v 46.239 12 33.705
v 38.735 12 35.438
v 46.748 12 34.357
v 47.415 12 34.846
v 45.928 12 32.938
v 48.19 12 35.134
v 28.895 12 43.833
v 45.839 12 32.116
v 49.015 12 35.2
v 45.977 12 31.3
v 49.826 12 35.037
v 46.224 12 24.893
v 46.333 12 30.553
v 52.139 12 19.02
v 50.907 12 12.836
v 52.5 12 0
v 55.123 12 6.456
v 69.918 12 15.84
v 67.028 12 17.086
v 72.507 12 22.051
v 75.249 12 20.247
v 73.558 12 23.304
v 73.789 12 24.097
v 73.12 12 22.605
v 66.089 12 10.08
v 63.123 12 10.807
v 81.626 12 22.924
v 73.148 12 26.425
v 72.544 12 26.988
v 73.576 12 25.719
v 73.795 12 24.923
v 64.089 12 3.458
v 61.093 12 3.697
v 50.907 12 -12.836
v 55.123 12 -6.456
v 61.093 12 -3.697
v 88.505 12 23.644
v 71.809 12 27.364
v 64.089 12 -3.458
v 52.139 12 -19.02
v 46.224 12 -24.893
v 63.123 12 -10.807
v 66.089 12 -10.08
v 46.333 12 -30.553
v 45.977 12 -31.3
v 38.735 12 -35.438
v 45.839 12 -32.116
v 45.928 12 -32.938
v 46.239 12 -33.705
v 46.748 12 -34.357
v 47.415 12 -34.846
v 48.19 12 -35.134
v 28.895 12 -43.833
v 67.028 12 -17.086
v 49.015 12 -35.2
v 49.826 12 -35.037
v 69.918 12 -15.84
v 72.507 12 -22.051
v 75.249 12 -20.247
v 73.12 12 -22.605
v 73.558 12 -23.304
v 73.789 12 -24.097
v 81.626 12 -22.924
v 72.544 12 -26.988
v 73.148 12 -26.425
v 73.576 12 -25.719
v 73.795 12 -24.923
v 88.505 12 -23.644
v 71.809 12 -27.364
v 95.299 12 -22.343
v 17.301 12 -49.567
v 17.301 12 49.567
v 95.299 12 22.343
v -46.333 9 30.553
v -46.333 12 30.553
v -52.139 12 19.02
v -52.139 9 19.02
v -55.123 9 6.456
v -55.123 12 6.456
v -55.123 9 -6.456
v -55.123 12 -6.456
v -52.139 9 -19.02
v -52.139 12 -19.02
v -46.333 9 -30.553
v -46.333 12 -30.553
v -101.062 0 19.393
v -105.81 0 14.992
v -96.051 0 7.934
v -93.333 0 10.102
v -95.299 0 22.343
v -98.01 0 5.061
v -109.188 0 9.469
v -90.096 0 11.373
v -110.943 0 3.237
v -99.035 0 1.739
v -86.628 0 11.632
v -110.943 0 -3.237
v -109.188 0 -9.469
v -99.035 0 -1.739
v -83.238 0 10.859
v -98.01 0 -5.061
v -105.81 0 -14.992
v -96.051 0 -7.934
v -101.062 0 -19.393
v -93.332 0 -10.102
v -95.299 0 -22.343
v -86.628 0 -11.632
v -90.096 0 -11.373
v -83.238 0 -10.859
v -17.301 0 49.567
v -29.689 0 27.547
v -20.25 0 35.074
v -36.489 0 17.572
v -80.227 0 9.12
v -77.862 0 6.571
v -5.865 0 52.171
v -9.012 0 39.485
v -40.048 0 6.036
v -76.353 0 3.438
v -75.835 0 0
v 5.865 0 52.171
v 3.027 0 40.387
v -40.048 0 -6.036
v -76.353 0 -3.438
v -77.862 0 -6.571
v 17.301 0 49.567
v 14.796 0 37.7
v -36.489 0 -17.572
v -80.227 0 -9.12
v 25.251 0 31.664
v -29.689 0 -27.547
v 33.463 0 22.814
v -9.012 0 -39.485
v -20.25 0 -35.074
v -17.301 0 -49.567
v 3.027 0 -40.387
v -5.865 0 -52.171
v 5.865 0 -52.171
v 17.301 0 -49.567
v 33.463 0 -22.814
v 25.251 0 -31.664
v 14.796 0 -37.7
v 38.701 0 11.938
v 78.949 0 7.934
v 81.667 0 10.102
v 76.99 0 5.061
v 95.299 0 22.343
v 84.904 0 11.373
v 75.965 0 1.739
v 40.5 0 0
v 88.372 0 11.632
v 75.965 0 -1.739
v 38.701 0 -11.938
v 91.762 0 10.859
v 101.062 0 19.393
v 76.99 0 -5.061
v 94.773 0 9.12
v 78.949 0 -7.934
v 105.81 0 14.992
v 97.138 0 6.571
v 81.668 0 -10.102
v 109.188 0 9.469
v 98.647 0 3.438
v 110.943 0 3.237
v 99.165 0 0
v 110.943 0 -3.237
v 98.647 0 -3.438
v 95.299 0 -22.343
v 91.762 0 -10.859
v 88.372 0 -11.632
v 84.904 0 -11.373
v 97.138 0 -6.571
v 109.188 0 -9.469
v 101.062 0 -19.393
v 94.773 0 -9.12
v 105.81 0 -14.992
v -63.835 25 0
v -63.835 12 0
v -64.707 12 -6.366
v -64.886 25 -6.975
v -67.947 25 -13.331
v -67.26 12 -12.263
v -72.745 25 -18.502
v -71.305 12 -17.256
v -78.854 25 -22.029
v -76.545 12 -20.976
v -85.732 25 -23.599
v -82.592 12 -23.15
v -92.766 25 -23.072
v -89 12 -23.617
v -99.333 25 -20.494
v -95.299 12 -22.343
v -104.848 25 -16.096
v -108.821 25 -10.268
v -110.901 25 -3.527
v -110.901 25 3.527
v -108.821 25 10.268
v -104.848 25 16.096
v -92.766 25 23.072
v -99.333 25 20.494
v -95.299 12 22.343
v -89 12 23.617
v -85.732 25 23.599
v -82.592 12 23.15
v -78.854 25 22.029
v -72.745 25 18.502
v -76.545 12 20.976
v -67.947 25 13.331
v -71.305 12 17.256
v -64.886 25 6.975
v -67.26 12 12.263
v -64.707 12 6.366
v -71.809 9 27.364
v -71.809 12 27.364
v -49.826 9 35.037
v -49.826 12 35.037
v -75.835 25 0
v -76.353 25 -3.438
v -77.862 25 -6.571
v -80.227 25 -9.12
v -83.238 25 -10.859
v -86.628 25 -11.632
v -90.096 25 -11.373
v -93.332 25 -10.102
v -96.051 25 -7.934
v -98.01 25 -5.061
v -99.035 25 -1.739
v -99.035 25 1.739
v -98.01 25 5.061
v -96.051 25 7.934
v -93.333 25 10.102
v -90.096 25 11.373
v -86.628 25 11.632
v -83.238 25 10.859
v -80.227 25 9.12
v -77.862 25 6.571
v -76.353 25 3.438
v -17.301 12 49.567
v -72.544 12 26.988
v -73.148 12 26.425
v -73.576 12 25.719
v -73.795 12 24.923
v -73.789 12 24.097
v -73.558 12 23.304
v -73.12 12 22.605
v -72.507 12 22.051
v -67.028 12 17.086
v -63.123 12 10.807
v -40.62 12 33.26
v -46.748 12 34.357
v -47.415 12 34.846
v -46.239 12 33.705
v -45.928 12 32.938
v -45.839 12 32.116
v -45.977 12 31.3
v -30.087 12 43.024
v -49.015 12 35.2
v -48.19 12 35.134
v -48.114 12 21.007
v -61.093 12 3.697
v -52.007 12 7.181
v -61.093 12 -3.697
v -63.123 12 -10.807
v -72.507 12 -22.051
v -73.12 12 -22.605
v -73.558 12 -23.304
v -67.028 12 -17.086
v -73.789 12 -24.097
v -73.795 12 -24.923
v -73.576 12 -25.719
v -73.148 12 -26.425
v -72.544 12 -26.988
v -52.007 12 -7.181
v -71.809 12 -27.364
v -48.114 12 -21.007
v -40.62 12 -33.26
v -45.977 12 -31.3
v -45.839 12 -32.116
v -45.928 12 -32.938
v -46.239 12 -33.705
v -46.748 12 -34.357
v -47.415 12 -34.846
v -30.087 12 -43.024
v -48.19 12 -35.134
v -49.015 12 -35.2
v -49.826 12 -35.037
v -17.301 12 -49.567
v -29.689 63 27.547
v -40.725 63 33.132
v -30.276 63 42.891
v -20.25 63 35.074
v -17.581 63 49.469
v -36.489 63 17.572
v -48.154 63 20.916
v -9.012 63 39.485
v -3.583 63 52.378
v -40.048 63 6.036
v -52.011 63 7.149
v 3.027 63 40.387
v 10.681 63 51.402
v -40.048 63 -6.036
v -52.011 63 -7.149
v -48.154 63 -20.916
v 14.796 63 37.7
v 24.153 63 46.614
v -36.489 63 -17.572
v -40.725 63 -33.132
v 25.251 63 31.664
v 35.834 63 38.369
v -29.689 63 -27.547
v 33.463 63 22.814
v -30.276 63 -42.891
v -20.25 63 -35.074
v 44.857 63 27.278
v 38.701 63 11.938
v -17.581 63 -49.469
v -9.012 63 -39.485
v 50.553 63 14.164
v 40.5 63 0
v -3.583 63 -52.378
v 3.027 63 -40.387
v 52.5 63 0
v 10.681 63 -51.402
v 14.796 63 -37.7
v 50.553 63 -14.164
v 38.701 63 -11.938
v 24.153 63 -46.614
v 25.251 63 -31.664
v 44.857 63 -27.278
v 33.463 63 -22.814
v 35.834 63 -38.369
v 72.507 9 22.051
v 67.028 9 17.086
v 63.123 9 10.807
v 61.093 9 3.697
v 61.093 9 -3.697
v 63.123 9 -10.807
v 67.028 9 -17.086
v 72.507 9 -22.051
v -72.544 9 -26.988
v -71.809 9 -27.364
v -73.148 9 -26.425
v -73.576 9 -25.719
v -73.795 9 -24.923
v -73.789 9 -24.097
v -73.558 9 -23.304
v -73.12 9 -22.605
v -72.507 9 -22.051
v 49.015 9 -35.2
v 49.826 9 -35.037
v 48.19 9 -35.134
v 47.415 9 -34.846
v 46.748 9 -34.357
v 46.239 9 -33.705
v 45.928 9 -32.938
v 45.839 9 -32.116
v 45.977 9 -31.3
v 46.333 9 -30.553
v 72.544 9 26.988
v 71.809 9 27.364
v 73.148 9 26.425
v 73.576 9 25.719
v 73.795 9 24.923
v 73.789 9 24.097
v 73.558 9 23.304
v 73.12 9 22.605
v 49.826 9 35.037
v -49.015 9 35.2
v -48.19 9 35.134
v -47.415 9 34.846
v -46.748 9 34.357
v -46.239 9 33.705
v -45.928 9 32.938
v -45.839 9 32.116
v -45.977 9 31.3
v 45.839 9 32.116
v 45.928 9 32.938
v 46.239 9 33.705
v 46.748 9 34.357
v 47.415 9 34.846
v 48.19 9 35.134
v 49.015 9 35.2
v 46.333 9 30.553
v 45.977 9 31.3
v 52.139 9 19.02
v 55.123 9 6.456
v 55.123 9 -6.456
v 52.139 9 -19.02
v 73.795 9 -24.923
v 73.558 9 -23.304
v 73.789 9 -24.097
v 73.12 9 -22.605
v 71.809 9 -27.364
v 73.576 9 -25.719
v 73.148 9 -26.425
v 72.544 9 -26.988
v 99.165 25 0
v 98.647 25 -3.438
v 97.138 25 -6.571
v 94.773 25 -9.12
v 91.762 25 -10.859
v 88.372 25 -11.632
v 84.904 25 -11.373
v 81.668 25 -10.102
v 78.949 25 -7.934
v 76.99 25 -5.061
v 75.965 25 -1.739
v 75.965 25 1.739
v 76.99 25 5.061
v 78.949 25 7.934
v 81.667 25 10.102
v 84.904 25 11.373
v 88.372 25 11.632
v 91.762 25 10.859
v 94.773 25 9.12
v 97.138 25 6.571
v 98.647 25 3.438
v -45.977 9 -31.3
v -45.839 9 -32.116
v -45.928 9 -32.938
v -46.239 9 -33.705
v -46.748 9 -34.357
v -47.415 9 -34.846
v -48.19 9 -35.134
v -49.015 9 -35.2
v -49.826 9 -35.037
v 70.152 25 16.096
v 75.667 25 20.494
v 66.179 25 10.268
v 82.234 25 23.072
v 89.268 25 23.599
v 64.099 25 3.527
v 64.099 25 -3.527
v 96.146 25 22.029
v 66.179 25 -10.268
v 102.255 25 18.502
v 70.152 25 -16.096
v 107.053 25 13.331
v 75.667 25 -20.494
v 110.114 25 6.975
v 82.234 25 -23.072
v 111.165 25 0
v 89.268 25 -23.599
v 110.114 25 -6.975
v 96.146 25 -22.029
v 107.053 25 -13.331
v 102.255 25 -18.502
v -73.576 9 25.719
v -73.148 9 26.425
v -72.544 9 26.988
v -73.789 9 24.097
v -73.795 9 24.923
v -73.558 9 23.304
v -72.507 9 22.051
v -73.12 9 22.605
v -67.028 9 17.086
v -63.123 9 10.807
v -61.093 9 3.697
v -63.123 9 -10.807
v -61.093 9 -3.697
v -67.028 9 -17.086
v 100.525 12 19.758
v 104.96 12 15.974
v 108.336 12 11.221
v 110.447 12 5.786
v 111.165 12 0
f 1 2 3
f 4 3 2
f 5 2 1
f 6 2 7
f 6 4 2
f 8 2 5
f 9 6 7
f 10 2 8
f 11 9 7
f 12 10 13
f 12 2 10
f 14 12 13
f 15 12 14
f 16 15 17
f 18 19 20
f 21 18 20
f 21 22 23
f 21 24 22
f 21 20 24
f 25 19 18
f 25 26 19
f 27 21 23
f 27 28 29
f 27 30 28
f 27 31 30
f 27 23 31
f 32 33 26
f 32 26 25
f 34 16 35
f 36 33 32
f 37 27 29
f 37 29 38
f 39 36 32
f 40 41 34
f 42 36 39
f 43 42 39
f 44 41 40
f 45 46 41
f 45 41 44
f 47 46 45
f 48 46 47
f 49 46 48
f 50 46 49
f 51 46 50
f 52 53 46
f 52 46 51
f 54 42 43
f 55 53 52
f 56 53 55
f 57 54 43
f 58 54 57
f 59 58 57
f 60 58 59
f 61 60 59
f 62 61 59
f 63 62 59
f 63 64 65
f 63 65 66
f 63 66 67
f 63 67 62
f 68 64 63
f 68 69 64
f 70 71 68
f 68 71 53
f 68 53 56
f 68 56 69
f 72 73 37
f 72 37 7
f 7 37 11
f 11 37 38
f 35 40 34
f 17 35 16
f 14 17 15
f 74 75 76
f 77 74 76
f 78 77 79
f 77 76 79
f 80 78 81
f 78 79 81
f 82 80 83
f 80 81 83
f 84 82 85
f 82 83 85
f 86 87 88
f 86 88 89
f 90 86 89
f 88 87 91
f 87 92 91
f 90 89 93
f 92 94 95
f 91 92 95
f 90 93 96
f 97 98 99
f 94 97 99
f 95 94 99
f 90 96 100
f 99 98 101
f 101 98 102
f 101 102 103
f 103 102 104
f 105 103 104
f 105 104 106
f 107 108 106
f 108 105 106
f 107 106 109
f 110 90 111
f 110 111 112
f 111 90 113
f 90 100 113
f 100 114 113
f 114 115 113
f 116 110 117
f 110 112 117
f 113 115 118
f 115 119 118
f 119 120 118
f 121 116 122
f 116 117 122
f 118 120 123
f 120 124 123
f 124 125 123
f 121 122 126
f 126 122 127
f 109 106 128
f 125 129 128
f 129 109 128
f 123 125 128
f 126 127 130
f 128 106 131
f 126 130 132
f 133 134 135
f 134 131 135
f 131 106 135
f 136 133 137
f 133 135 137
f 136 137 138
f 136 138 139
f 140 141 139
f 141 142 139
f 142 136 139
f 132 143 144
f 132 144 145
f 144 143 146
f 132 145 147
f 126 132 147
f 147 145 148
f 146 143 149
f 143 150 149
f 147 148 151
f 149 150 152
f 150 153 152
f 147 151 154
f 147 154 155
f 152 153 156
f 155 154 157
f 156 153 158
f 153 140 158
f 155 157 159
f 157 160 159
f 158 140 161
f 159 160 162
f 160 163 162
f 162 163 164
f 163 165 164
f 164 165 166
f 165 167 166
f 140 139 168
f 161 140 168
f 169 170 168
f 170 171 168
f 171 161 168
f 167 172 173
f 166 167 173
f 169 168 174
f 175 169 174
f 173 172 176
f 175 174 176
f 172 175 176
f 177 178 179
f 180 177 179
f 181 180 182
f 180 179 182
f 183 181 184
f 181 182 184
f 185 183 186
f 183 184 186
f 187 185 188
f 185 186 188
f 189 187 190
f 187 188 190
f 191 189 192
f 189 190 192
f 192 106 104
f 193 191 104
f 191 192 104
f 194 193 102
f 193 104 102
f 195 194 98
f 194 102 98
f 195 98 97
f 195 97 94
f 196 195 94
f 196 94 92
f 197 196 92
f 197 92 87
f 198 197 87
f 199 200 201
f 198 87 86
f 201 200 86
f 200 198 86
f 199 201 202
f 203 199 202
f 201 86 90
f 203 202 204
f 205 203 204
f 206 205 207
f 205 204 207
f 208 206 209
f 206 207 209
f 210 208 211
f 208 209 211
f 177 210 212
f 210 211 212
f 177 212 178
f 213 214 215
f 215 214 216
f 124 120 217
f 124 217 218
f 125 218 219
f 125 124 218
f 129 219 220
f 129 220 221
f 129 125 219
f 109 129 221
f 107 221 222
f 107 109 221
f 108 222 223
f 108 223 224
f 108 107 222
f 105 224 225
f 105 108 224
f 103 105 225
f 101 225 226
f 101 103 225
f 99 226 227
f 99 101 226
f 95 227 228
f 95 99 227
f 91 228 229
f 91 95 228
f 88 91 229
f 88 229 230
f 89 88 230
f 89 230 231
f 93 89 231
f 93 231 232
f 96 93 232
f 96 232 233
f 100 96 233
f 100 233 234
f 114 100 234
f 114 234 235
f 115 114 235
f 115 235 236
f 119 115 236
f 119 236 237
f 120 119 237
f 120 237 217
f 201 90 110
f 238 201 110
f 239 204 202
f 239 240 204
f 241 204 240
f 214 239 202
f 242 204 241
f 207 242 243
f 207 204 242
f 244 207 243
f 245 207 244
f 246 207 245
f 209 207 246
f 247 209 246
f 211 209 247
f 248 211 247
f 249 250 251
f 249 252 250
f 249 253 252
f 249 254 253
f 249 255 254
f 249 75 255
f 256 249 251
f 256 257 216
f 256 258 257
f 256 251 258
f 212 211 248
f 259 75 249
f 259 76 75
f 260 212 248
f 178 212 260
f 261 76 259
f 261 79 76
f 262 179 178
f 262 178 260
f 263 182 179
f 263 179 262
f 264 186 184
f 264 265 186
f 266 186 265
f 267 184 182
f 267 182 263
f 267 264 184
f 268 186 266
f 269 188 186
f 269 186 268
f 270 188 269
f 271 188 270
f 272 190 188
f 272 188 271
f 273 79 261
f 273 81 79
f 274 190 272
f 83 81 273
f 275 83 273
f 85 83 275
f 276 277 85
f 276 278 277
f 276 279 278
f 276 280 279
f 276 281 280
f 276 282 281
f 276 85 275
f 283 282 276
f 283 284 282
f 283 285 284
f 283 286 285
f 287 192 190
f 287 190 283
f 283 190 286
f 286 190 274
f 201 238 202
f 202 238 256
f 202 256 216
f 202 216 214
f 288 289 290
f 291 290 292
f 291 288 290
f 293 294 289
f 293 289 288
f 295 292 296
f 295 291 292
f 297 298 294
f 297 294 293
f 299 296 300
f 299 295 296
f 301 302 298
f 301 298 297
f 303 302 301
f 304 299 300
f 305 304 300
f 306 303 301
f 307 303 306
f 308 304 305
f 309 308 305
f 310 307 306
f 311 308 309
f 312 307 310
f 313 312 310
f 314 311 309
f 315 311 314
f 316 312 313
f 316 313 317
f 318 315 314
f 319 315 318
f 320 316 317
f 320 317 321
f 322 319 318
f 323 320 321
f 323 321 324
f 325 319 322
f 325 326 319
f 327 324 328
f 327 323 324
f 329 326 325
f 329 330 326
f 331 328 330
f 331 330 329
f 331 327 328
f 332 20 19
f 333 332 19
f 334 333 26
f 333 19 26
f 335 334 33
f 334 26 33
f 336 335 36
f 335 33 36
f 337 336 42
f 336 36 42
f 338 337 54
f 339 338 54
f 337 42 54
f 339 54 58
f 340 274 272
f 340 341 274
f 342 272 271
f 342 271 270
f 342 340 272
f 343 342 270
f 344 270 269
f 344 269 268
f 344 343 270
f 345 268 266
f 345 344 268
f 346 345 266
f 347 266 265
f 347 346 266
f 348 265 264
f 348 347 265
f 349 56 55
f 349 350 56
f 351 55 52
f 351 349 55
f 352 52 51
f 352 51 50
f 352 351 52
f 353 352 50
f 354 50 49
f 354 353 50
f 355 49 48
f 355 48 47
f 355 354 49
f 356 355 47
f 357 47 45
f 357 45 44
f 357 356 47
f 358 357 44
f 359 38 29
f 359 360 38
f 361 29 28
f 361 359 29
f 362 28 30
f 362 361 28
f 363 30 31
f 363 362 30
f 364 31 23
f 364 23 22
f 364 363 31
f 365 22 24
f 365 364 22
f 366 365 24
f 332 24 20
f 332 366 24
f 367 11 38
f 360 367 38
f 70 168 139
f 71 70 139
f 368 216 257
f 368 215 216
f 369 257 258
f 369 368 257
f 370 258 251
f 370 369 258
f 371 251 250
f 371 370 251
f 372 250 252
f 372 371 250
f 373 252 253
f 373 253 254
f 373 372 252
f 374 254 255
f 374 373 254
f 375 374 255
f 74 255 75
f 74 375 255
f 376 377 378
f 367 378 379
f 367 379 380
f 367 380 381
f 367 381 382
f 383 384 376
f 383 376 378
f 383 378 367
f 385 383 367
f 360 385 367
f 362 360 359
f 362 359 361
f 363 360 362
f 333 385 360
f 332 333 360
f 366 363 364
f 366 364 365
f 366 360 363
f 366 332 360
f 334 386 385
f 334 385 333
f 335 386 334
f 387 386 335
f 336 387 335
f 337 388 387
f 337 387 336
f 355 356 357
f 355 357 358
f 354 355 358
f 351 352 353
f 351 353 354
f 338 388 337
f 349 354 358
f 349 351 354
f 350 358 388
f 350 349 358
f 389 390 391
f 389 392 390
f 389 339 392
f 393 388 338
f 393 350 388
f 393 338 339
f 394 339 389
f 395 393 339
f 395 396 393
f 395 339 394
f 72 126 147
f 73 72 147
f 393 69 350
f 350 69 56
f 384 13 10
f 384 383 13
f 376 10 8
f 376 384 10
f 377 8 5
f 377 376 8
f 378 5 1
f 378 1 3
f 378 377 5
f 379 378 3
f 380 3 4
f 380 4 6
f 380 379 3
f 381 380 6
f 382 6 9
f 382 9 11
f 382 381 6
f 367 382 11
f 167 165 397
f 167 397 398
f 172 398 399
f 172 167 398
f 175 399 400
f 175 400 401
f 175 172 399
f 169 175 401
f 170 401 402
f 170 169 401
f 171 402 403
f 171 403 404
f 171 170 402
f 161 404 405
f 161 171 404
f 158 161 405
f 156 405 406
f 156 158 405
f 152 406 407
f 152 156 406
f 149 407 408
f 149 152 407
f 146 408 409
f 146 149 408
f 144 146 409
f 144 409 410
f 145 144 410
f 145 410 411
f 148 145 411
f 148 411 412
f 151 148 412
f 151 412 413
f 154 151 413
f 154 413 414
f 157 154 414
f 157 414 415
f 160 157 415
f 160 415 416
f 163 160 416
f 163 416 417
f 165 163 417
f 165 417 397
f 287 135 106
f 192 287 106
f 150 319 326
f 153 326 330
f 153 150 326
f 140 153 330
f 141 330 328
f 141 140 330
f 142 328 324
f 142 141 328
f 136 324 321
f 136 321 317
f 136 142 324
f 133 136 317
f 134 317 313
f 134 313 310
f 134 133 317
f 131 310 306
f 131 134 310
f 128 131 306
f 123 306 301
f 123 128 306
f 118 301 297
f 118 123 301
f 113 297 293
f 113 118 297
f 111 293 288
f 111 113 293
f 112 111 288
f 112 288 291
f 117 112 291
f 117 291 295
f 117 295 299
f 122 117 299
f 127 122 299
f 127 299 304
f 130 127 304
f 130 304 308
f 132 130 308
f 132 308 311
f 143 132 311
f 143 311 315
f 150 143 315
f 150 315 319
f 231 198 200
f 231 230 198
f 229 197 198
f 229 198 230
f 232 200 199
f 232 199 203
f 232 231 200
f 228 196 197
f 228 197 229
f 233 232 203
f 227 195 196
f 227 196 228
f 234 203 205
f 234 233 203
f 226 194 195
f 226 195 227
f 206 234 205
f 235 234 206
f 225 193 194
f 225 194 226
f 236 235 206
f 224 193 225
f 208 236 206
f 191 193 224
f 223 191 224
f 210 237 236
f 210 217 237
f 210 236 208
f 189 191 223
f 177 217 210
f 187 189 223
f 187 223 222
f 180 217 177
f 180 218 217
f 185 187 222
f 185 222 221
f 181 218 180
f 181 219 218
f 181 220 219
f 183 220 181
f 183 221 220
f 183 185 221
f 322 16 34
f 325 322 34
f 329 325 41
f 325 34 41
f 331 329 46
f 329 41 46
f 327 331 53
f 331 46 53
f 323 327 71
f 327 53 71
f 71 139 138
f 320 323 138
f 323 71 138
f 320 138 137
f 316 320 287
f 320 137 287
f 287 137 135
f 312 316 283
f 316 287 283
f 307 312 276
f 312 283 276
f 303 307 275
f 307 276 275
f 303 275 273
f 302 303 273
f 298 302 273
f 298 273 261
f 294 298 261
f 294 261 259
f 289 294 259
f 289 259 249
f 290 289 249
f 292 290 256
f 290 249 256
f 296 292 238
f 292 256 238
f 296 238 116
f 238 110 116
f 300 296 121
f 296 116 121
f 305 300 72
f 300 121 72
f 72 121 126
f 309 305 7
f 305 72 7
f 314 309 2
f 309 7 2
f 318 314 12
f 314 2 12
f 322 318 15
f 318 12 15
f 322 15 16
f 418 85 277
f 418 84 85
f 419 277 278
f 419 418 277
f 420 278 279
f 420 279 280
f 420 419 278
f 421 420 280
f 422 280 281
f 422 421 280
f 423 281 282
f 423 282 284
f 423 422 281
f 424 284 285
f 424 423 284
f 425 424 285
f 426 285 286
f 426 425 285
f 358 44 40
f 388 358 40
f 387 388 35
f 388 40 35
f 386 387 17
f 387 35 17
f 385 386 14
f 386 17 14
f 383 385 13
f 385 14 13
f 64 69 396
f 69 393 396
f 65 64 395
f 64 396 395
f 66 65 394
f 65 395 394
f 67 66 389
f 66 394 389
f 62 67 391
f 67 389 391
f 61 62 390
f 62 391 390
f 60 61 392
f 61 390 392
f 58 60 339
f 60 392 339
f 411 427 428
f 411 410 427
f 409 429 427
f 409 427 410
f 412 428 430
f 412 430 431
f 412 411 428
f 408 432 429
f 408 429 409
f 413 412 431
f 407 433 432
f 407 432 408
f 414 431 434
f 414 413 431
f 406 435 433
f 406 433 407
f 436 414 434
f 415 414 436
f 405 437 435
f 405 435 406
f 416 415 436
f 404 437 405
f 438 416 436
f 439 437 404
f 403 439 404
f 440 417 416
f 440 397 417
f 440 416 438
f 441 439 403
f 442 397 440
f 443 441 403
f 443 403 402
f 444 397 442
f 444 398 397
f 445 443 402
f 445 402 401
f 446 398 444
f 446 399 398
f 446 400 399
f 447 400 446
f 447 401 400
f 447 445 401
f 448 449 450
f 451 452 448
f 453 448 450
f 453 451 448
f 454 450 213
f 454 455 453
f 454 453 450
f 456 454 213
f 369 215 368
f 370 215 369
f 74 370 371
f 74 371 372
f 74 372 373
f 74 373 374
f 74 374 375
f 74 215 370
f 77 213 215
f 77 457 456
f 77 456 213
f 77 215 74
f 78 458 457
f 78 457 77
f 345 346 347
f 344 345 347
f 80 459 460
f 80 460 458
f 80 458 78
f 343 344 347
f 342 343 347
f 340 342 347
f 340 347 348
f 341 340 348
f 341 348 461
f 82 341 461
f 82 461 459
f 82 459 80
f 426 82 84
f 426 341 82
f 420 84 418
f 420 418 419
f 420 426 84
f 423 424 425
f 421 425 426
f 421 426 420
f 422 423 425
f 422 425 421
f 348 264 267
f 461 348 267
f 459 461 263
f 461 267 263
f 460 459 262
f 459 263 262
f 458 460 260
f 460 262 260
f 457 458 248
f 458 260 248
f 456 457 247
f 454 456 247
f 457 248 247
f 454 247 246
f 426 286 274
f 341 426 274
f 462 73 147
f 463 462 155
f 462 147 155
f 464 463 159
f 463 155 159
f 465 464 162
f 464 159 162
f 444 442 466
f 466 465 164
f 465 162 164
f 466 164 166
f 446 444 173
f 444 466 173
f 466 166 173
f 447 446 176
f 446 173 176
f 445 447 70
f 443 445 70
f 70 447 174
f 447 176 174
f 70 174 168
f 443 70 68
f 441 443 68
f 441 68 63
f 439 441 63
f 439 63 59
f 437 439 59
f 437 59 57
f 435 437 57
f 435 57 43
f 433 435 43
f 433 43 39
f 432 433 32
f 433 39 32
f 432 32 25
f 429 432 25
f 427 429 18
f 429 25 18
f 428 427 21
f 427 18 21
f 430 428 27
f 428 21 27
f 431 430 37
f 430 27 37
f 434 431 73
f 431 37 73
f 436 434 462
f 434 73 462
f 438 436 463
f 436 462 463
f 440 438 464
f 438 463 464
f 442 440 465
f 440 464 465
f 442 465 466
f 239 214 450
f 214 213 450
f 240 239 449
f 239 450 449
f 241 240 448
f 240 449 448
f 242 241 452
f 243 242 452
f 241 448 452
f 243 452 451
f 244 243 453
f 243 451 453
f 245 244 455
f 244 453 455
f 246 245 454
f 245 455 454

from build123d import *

# Parameters (mm, degrees)
SKETCH1_R           = 40.5
SKETCH1_R_2         = 11.665
BOSS_EXTRUDE1_DEPTH = 12
SKETCH1_3_R         = 23.665
SKETCH1_3_R_2       = 11.665
SKETCH1_3_R_3       = 52.5
SKETCH1_3_R_4       = 40.5
BOSS_EXTRUDE2_DEPTH = 25
SKETCH1_4_R         = 40.5
BOSS_EXTRUDE3_DEPTH = 63
CUT_EXTRUDE1_DEPTH  = 3
FILLET1_R           = 3
FILLET2_R           = 3


with BuildPart() as part:
    # Sketch1 → Boss-Extrude1 (new body)
    with BuildSketch(Plane(origin=(0, 0, 0), x_dir=(1, 0, 0), z_dir=(0, 1, 0))):
        with BuildLine():
            Line((-17.301, 49.56738241), (-95.298631714, 22.343087709))
            ThreePointArc((-95.298631714, 22.343087709), (-111.165, 0), (-95.298631714, -22.343087709))
            Line((-95.298631714, -22.343087709), (-17.301, -49.56738241))
            ThreePointArc((-17.301, -49.56738241), (0, -52.5), (17.301, -49.56738241))
            Line((17.301, -49.56738241), (95.298631714, -22.343087709))
            ThreePointArc((95.298631714, -22.343087709), (111.165, 0), (95.298631714, 22.343087709))
            Line((95.298631714, 22.343087709), (17.301, 49.56738241))
            ThreePointArc((17.301, 49.56738241), (0, 52.5), (-17.301, 49.56738241))
        make_face()
        Circle(SKETCH1_R, mode=Mode.SUBTRACT)
        with Locations((-87.5, 0)):
            Circle(SKETCH1_R_2, mode=Mode.SUBTRACT)
        with Locations((87.5, 0)):
            Circle(SKETCH1_R_2, mode=Mode.SUBTRACT)
    extrude(amount=BOSS_EXTRUDE1_DEPTH)

    # Sketch1<3> → Boss-Extrude2 (add)
    # profile 1 of 3: a face of its own
    with BuildSketch(Plane(origin=(0, 0, 0), x_dir=(1, 0, 0), z_dir=(0, 1, 0))):
        with Locations((-87.5, 0)):
            Circle(SKETCH1_3_R)
        with Locations((-87.5, 0)):
            Circle(SKETCH1_3_R_2, mode=Mode.SUBTRACT)
    # profile 2 of 3: a face of its own
    with BuildSketch(Plane(origin=(0, 0, 0), x_dir=(1, 0, 0), z_dir=(0, 1, 0))):
        Circle(SKETCH1_3_R_3)
        Circle(SKETCH1_3_R_4, mode=Mode.SUBTRACT)
    # profile 3 of 3: a face of its own
    with BuildSketch(Plane(origin=(0, 0, 0), x_dir=(1, 0, 0), z_dir=(0, 1, 0))):
        with Locations((87.5, 0)):
            Circle(SKETCH1_3_R)
        with Locations((87.5, 0)):
            Circle(SKETCH1_3_R_2, mode=Mode.SUBTRACT)
    extrude(amount=BOSS_EXTRUDE2_DEPTH)

    # Sketch1<4> → Boss-Extrude3 (add)
    with BuildSketch(Plane(origin=(0, 0, 0), x_dir=(1, 0, 0), z_dir=(0, 1, 0))):
        with BuildLine():
            ThreePointArc((17.301, 49.56738241), (0, 52.5), (-17.301, 49.56738241))
            ThreePointArc((-17.301, 49.56738241), (-52.5, 0), (-17.301, -49.56738241))
            ThreePointArc((-17.301, -49.56738241), (0, -52.5), (17.301, -49.56738241))
            ThreePointArc((17.301, -49.56738241), (42.805096075, -30.396936523), (52.5, 0))
            ThreePointArc((52.5, 0), (42.805096075, 30.396936523), (17.301, 49.56738241))
        make_face()
        Circle(SKETCH1_4_R, mode=Mode.SUBTRACT)
    extrude(amount=BOSS_EXTRUDE3_DEPTH)

    # Sketch2 → Cut-Extrude1 (cut)
    with BuildSketch(Plane(origin=(0, 12, 0), x_dir=(1, 0, 0), z_dir=(0, 1, 0))):
        with BuildLine():
            Line((-78.3996229, -25.064025248), (-40.010112847, -38.46350049))
            ThreePointArc((-40.010112847, -38.46350049), (-55.5, 0), (-40.010112847, 38.46350049))
            Line((-40.010112847, 38.46350049), (-78.3996229, 25.064025248))
            ThreePointArc((-78.3996229, 25.064025248), (-60.835, 0), (-78.3996229, -25.064025248))
        make_face()
        with BuildLine():
            Line((78.3996229, 25.064025248), (40.010112847, 38.46350049))
            ThreePointArc((40.010112847, 38.46350049), (55.5, 0), (40.010112847, -38.46350049))
            Line((40.010112847, -38.46350049), (78.3996229, -25.064025248))
            ThreePointArc((78.3996229, -25.064025248), (60.835, 0), (78.3996229, 25.064025248))
        make_face()
    extrude(amount=-CUT_EXTRUDE1_DEPTH, mode=Mode.SUBTRACT)

    # Fillet1
    fillet1_edges = [part.edges().sort_by_distance(p)[0] for p in [
        (-78.3996229, 10.5, -25.064025248),
        (-78.3996229, 10.5, 25.064025248),
        (-40.010112847, 10.5, 38.46350049),
        (-40.010112847, 10.5, -38.46350049),
    ]]
    fillet(fillet1_edges, radius=FILLET1_R)

    # Fillet2
    fillet2_edges = [part.edges().sort_by_distance(p)[0] for p in [
        (78.3996229, 10.5, 25.064025248),
        (78.3996229, 10.5, -25.064025248),
        (40.010112847, 10.5, -38.46350049),
        (40.010112847, 10.5, 38.46350049),
    ]]
    fillet(fillet2_edges, radius=FILLET2_R)


solid = part.part
